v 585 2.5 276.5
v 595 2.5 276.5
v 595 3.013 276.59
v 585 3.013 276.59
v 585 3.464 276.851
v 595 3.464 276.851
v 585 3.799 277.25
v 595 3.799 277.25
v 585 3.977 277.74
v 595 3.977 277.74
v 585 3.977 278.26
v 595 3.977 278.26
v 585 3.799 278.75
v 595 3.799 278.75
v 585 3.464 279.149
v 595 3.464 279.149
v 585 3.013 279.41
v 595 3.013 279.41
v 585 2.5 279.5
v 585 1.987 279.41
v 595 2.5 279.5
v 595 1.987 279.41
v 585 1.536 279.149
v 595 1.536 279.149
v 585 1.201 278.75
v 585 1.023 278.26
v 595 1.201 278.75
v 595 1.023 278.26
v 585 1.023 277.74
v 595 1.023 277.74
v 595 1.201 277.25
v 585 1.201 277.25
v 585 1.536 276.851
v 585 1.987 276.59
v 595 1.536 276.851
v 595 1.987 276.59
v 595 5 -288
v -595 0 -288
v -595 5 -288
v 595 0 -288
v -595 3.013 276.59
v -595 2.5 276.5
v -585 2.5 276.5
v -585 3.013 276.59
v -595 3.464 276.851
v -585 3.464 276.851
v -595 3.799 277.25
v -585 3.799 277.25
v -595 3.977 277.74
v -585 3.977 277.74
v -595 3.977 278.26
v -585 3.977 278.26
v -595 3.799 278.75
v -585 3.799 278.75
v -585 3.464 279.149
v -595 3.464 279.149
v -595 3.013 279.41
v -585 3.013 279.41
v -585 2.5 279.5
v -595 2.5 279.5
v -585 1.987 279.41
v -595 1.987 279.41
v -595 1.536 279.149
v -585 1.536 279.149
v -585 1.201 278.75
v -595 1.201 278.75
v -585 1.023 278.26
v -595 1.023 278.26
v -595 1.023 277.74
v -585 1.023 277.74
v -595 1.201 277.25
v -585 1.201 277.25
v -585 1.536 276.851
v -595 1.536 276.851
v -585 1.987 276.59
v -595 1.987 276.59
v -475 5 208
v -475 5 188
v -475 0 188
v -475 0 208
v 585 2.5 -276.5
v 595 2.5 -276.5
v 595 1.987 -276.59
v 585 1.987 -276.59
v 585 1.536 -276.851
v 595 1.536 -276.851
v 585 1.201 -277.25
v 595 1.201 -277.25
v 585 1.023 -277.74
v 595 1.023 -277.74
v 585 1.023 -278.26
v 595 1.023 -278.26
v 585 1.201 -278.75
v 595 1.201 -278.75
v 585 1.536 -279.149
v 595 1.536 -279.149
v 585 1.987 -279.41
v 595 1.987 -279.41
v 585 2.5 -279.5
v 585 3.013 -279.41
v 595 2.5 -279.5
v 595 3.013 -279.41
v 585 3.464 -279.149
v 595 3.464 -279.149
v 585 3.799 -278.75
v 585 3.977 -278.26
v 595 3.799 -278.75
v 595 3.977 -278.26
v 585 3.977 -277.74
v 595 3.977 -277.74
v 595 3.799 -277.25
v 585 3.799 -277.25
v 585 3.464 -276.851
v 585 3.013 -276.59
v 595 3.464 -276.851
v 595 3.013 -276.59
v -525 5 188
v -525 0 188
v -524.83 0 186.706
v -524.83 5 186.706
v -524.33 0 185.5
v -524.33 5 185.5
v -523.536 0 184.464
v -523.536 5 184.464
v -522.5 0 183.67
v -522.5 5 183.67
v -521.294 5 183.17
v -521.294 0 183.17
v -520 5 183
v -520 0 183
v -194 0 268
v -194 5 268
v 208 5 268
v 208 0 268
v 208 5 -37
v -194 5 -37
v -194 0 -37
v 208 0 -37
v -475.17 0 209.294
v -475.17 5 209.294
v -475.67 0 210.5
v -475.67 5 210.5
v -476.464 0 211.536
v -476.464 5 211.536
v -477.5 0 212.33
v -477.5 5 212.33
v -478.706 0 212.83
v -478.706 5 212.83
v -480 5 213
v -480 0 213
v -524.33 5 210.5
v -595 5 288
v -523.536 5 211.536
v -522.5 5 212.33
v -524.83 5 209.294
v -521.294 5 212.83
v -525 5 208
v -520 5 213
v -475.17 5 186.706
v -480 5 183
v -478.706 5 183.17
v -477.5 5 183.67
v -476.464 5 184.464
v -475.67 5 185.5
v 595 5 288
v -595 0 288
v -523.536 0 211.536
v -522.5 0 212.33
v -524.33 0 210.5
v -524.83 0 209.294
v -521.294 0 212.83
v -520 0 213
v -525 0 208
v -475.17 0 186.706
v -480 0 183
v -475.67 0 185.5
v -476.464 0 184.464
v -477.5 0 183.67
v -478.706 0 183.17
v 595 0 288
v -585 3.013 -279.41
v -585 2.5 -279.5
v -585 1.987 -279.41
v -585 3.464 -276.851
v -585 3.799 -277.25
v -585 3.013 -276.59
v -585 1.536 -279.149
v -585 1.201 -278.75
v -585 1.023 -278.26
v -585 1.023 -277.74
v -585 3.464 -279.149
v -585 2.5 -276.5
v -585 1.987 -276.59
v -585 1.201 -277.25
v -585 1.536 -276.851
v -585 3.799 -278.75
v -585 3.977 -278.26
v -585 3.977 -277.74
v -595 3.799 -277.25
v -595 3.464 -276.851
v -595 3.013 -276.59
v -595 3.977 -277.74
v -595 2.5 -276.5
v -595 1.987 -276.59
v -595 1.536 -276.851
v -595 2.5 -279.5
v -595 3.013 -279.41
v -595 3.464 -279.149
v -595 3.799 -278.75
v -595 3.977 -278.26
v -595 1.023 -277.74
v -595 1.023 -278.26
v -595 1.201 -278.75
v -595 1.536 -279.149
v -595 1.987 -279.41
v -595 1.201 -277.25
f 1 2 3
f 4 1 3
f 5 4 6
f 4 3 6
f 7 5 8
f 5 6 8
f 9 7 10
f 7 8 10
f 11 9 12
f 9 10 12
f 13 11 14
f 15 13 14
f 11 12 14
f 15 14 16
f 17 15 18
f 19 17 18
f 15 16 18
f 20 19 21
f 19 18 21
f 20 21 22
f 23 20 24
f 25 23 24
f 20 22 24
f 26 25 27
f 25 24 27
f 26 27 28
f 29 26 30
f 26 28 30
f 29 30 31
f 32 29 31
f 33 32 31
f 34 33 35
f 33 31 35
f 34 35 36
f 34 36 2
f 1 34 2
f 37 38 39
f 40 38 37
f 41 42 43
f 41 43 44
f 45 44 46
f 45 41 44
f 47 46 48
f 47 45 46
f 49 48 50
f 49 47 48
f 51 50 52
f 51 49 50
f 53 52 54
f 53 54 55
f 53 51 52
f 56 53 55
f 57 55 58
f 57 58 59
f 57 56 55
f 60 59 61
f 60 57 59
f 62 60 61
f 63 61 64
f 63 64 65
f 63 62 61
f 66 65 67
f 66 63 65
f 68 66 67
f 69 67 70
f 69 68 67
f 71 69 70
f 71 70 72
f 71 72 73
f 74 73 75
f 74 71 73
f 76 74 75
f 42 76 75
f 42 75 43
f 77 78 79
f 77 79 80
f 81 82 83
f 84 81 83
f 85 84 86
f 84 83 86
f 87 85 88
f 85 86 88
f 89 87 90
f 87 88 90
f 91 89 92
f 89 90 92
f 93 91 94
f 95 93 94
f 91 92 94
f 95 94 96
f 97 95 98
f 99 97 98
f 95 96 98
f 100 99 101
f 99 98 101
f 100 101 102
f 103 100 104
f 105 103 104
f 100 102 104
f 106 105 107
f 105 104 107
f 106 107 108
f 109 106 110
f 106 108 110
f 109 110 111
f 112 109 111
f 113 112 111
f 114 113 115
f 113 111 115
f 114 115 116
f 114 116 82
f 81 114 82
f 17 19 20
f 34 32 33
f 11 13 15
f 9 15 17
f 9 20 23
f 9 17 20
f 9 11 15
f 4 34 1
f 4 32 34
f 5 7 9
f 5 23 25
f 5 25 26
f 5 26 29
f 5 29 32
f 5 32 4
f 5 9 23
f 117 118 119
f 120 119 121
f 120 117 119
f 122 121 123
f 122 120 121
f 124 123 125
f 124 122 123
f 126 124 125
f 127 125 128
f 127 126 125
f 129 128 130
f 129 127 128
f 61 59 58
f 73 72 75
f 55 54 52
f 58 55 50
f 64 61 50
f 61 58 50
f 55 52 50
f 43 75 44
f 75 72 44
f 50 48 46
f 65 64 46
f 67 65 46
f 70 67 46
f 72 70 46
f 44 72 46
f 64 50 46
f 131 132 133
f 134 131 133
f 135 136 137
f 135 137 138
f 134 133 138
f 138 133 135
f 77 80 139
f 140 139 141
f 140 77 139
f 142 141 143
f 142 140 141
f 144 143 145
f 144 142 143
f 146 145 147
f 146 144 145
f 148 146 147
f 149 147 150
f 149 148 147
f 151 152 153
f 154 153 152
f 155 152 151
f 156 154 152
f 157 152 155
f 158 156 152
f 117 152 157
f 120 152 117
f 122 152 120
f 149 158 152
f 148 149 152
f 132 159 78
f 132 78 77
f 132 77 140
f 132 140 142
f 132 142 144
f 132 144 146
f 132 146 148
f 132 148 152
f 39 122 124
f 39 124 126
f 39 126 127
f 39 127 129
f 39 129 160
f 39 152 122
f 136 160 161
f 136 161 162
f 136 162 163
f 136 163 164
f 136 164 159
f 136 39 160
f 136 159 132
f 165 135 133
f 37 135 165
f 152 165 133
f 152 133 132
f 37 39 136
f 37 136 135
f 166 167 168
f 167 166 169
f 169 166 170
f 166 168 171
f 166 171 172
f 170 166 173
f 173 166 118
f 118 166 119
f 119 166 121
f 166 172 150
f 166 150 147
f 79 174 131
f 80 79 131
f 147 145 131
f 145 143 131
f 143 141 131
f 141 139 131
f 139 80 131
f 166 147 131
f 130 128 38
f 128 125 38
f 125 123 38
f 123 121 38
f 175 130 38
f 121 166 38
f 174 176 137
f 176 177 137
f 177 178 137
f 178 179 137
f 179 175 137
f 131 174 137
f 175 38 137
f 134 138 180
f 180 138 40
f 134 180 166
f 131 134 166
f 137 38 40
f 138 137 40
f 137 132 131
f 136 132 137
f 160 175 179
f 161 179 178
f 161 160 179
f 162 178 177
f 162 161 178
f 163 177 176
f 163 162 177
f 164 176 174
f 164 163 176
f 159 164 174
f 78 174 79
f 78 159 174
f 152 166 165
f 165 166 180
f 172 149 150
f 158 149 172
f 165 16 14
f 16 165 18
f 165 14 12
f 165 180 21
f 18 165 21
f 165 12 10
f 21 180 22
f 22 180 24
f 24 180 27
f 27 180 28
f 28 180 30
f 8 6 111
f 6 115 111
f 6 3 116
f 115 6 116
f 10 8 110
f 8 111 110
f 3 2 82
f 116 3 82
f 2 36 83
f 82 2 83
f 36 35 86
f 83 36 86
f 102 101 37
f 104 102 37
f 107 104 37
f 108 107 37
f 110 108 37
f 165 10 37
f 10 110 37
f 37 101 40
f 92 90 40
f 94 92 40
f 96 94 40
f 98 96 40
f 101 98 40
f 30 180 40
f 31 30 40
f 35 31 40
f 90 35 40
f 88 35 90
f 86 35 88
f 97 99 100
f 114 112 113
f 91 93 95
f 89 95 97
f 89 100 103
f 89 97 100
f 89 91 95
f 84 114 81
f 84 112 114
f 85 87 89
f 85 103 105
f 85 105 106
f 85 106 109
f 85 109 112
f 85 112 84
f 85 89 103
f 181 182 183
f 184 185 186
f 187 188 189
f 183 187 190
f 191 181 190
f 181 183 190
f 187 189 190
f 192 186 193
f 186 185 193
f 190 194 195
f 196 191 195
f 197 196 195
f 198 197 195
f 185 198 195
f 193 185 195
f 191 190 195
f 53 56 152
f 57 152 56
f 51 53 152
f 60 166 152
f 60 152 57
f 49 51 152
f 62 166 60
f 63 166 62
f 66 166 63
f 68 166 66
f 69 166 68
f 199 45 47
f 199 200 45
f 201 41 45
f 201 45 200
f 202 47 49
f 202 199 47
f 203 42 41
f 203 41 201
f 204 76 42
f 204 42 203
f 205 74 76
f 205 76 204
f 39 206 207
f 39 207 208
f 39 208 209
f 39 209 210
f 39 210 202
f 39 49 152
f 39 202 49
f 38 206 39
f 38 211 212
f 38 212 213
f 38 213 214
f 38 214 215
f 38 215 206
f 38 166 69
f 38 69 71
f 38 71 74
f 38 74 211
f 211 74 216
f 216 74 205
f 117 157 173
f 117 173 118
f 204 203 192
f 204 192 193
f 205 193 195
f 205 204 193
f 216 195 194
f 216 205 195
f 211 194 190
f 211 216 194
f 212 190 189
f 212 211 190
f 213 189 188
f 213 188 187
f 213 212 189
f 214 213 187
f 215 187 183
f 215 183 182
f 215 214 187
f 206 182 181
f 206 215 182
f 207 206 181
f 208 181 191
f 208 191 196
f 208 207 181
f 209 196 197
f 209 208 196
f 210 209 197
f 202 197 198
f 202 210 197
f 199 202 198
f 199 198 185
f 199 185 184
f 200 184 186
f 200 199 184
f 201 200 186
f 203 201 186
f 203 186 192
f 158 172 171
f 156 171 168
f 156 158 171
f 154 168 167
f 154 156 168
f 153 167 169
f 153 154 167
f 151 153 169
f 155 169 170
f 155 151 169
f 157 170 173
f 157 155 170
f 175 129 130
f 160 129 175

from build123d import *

# Parameters (mm, degrees)
SKETCH1_W           = 1190
SKETCH1_H           = 576
BOSS_EXTRUDE1_DEPTH = 5
SKETCH2_R           = 1.5
CUT_EXTRUDE1_DEPTH  = 10
SKETCH3_W           = 150
SKETCH3_H           = 150
CUT_EXTRUDE2_DEPTH  = 10
SKETCH4_W           = 402
SKETCH4_H           = 305
CUT_EXTRUDE3_DEPTH  = 6
CUT_EXTRUDE4_DEPTH  = 10


with BuildPart() as part:
    # Sketch1 → Boss-Extrude1 (new body)
    with BuildSketch(Plane(origin=(0, 0, 0), x_dir=(1, 0, 0), z_dir=(0, 1, 0))):
        Rectangle(SKETCH1_W, SKETCH1_H)
    extrude(amount=BOSS_EXTRUDE1_DEPTH)

    # Sketch2 → Cut-Extrude1 (cut)
    with BuildSketch(Plane(origin=(595, 0, 0), x_dir=(0, 0, -1), z_dir=(1, 0, 0))):
        with Locations((-278, 2.5)):
            Circle(SKETCH2_R)
        with Locations(Location((278, 2.5, 0), (0, 0, 180))):
            Circle(SKETCH2_R)
    cut_extrude1 = extrude(amount=-CUT_EXTRUDE1_DEPTH, mode=Mode.SUBTRACT)

    # Mirror1: Cut-Extrude1 across plane
    add(cut_extrude1.mirror(Plane(origin=(0, 0, 0), x_dir=(0, 0, 1), z_dir=(1, 0, 0))), mode=Mode.SUBTRACT)

    # Sketch3 → Cut-Extrude2 (cut)
    with BuildSketch(Plane(origin=(0, 5, 0), x_dir=(1, 0, 0), z_dir=(0, 1, 0))):
        with Locations((5, -143)):
            Rectangle(SKETCH3_W, SKETCH3_H)
    extrude(amount=-CUT_EXTRUDE2_DEPTH, mode=Mode.SUBTRACT)

    # Sketch4 → Cut-Extrude3 (cut)
    with BuildSketch(Plane(origin=(0, 5, 0), x_dir=(1, 0, 0), z_dir=(0, 1, 0))):
        with Locations((7, -115.5)):
            Rectangle(SKETCH4_W, SKETCH4_H)
    extrude(amount=-CUT_EXTRUDE3_DEPTH, mode=Mode.SUBTRACT)

    # Sketch5 → Cut-Extrude4 (cut)
    with BuildSketch(Plane(origin=(0, 5, 0), x_dir=(1, 0, 0), z_dir=(0, 1, 0))):
        with BuildLine():
            Line((-520, -183), (-480, -183))
            ThreePointArc((-480, -183), (-476.464466094, -184.464466094), (-475, -188))
            Line((-475, -188), (-475, -208))
            ThreePointArc((-475, -208), (-476.464466094, -211.535533906), (-480, -213))
            Line((-480, -213), (-520, -213))
            ThreePointArc((-520, -213), (-523.535533906, -211.535533906), (-525, -208))
            Line((-525, -208), (-525, -188))
            ThreePointArc((-525, -188), (-523.535533906, -184.464466094), (-520, -183))
        make_face()
    extrude(amount=-CUT_EXTRUDE4_DEPTH, mode=Mode.SUBTRACT)


solid = part.part
